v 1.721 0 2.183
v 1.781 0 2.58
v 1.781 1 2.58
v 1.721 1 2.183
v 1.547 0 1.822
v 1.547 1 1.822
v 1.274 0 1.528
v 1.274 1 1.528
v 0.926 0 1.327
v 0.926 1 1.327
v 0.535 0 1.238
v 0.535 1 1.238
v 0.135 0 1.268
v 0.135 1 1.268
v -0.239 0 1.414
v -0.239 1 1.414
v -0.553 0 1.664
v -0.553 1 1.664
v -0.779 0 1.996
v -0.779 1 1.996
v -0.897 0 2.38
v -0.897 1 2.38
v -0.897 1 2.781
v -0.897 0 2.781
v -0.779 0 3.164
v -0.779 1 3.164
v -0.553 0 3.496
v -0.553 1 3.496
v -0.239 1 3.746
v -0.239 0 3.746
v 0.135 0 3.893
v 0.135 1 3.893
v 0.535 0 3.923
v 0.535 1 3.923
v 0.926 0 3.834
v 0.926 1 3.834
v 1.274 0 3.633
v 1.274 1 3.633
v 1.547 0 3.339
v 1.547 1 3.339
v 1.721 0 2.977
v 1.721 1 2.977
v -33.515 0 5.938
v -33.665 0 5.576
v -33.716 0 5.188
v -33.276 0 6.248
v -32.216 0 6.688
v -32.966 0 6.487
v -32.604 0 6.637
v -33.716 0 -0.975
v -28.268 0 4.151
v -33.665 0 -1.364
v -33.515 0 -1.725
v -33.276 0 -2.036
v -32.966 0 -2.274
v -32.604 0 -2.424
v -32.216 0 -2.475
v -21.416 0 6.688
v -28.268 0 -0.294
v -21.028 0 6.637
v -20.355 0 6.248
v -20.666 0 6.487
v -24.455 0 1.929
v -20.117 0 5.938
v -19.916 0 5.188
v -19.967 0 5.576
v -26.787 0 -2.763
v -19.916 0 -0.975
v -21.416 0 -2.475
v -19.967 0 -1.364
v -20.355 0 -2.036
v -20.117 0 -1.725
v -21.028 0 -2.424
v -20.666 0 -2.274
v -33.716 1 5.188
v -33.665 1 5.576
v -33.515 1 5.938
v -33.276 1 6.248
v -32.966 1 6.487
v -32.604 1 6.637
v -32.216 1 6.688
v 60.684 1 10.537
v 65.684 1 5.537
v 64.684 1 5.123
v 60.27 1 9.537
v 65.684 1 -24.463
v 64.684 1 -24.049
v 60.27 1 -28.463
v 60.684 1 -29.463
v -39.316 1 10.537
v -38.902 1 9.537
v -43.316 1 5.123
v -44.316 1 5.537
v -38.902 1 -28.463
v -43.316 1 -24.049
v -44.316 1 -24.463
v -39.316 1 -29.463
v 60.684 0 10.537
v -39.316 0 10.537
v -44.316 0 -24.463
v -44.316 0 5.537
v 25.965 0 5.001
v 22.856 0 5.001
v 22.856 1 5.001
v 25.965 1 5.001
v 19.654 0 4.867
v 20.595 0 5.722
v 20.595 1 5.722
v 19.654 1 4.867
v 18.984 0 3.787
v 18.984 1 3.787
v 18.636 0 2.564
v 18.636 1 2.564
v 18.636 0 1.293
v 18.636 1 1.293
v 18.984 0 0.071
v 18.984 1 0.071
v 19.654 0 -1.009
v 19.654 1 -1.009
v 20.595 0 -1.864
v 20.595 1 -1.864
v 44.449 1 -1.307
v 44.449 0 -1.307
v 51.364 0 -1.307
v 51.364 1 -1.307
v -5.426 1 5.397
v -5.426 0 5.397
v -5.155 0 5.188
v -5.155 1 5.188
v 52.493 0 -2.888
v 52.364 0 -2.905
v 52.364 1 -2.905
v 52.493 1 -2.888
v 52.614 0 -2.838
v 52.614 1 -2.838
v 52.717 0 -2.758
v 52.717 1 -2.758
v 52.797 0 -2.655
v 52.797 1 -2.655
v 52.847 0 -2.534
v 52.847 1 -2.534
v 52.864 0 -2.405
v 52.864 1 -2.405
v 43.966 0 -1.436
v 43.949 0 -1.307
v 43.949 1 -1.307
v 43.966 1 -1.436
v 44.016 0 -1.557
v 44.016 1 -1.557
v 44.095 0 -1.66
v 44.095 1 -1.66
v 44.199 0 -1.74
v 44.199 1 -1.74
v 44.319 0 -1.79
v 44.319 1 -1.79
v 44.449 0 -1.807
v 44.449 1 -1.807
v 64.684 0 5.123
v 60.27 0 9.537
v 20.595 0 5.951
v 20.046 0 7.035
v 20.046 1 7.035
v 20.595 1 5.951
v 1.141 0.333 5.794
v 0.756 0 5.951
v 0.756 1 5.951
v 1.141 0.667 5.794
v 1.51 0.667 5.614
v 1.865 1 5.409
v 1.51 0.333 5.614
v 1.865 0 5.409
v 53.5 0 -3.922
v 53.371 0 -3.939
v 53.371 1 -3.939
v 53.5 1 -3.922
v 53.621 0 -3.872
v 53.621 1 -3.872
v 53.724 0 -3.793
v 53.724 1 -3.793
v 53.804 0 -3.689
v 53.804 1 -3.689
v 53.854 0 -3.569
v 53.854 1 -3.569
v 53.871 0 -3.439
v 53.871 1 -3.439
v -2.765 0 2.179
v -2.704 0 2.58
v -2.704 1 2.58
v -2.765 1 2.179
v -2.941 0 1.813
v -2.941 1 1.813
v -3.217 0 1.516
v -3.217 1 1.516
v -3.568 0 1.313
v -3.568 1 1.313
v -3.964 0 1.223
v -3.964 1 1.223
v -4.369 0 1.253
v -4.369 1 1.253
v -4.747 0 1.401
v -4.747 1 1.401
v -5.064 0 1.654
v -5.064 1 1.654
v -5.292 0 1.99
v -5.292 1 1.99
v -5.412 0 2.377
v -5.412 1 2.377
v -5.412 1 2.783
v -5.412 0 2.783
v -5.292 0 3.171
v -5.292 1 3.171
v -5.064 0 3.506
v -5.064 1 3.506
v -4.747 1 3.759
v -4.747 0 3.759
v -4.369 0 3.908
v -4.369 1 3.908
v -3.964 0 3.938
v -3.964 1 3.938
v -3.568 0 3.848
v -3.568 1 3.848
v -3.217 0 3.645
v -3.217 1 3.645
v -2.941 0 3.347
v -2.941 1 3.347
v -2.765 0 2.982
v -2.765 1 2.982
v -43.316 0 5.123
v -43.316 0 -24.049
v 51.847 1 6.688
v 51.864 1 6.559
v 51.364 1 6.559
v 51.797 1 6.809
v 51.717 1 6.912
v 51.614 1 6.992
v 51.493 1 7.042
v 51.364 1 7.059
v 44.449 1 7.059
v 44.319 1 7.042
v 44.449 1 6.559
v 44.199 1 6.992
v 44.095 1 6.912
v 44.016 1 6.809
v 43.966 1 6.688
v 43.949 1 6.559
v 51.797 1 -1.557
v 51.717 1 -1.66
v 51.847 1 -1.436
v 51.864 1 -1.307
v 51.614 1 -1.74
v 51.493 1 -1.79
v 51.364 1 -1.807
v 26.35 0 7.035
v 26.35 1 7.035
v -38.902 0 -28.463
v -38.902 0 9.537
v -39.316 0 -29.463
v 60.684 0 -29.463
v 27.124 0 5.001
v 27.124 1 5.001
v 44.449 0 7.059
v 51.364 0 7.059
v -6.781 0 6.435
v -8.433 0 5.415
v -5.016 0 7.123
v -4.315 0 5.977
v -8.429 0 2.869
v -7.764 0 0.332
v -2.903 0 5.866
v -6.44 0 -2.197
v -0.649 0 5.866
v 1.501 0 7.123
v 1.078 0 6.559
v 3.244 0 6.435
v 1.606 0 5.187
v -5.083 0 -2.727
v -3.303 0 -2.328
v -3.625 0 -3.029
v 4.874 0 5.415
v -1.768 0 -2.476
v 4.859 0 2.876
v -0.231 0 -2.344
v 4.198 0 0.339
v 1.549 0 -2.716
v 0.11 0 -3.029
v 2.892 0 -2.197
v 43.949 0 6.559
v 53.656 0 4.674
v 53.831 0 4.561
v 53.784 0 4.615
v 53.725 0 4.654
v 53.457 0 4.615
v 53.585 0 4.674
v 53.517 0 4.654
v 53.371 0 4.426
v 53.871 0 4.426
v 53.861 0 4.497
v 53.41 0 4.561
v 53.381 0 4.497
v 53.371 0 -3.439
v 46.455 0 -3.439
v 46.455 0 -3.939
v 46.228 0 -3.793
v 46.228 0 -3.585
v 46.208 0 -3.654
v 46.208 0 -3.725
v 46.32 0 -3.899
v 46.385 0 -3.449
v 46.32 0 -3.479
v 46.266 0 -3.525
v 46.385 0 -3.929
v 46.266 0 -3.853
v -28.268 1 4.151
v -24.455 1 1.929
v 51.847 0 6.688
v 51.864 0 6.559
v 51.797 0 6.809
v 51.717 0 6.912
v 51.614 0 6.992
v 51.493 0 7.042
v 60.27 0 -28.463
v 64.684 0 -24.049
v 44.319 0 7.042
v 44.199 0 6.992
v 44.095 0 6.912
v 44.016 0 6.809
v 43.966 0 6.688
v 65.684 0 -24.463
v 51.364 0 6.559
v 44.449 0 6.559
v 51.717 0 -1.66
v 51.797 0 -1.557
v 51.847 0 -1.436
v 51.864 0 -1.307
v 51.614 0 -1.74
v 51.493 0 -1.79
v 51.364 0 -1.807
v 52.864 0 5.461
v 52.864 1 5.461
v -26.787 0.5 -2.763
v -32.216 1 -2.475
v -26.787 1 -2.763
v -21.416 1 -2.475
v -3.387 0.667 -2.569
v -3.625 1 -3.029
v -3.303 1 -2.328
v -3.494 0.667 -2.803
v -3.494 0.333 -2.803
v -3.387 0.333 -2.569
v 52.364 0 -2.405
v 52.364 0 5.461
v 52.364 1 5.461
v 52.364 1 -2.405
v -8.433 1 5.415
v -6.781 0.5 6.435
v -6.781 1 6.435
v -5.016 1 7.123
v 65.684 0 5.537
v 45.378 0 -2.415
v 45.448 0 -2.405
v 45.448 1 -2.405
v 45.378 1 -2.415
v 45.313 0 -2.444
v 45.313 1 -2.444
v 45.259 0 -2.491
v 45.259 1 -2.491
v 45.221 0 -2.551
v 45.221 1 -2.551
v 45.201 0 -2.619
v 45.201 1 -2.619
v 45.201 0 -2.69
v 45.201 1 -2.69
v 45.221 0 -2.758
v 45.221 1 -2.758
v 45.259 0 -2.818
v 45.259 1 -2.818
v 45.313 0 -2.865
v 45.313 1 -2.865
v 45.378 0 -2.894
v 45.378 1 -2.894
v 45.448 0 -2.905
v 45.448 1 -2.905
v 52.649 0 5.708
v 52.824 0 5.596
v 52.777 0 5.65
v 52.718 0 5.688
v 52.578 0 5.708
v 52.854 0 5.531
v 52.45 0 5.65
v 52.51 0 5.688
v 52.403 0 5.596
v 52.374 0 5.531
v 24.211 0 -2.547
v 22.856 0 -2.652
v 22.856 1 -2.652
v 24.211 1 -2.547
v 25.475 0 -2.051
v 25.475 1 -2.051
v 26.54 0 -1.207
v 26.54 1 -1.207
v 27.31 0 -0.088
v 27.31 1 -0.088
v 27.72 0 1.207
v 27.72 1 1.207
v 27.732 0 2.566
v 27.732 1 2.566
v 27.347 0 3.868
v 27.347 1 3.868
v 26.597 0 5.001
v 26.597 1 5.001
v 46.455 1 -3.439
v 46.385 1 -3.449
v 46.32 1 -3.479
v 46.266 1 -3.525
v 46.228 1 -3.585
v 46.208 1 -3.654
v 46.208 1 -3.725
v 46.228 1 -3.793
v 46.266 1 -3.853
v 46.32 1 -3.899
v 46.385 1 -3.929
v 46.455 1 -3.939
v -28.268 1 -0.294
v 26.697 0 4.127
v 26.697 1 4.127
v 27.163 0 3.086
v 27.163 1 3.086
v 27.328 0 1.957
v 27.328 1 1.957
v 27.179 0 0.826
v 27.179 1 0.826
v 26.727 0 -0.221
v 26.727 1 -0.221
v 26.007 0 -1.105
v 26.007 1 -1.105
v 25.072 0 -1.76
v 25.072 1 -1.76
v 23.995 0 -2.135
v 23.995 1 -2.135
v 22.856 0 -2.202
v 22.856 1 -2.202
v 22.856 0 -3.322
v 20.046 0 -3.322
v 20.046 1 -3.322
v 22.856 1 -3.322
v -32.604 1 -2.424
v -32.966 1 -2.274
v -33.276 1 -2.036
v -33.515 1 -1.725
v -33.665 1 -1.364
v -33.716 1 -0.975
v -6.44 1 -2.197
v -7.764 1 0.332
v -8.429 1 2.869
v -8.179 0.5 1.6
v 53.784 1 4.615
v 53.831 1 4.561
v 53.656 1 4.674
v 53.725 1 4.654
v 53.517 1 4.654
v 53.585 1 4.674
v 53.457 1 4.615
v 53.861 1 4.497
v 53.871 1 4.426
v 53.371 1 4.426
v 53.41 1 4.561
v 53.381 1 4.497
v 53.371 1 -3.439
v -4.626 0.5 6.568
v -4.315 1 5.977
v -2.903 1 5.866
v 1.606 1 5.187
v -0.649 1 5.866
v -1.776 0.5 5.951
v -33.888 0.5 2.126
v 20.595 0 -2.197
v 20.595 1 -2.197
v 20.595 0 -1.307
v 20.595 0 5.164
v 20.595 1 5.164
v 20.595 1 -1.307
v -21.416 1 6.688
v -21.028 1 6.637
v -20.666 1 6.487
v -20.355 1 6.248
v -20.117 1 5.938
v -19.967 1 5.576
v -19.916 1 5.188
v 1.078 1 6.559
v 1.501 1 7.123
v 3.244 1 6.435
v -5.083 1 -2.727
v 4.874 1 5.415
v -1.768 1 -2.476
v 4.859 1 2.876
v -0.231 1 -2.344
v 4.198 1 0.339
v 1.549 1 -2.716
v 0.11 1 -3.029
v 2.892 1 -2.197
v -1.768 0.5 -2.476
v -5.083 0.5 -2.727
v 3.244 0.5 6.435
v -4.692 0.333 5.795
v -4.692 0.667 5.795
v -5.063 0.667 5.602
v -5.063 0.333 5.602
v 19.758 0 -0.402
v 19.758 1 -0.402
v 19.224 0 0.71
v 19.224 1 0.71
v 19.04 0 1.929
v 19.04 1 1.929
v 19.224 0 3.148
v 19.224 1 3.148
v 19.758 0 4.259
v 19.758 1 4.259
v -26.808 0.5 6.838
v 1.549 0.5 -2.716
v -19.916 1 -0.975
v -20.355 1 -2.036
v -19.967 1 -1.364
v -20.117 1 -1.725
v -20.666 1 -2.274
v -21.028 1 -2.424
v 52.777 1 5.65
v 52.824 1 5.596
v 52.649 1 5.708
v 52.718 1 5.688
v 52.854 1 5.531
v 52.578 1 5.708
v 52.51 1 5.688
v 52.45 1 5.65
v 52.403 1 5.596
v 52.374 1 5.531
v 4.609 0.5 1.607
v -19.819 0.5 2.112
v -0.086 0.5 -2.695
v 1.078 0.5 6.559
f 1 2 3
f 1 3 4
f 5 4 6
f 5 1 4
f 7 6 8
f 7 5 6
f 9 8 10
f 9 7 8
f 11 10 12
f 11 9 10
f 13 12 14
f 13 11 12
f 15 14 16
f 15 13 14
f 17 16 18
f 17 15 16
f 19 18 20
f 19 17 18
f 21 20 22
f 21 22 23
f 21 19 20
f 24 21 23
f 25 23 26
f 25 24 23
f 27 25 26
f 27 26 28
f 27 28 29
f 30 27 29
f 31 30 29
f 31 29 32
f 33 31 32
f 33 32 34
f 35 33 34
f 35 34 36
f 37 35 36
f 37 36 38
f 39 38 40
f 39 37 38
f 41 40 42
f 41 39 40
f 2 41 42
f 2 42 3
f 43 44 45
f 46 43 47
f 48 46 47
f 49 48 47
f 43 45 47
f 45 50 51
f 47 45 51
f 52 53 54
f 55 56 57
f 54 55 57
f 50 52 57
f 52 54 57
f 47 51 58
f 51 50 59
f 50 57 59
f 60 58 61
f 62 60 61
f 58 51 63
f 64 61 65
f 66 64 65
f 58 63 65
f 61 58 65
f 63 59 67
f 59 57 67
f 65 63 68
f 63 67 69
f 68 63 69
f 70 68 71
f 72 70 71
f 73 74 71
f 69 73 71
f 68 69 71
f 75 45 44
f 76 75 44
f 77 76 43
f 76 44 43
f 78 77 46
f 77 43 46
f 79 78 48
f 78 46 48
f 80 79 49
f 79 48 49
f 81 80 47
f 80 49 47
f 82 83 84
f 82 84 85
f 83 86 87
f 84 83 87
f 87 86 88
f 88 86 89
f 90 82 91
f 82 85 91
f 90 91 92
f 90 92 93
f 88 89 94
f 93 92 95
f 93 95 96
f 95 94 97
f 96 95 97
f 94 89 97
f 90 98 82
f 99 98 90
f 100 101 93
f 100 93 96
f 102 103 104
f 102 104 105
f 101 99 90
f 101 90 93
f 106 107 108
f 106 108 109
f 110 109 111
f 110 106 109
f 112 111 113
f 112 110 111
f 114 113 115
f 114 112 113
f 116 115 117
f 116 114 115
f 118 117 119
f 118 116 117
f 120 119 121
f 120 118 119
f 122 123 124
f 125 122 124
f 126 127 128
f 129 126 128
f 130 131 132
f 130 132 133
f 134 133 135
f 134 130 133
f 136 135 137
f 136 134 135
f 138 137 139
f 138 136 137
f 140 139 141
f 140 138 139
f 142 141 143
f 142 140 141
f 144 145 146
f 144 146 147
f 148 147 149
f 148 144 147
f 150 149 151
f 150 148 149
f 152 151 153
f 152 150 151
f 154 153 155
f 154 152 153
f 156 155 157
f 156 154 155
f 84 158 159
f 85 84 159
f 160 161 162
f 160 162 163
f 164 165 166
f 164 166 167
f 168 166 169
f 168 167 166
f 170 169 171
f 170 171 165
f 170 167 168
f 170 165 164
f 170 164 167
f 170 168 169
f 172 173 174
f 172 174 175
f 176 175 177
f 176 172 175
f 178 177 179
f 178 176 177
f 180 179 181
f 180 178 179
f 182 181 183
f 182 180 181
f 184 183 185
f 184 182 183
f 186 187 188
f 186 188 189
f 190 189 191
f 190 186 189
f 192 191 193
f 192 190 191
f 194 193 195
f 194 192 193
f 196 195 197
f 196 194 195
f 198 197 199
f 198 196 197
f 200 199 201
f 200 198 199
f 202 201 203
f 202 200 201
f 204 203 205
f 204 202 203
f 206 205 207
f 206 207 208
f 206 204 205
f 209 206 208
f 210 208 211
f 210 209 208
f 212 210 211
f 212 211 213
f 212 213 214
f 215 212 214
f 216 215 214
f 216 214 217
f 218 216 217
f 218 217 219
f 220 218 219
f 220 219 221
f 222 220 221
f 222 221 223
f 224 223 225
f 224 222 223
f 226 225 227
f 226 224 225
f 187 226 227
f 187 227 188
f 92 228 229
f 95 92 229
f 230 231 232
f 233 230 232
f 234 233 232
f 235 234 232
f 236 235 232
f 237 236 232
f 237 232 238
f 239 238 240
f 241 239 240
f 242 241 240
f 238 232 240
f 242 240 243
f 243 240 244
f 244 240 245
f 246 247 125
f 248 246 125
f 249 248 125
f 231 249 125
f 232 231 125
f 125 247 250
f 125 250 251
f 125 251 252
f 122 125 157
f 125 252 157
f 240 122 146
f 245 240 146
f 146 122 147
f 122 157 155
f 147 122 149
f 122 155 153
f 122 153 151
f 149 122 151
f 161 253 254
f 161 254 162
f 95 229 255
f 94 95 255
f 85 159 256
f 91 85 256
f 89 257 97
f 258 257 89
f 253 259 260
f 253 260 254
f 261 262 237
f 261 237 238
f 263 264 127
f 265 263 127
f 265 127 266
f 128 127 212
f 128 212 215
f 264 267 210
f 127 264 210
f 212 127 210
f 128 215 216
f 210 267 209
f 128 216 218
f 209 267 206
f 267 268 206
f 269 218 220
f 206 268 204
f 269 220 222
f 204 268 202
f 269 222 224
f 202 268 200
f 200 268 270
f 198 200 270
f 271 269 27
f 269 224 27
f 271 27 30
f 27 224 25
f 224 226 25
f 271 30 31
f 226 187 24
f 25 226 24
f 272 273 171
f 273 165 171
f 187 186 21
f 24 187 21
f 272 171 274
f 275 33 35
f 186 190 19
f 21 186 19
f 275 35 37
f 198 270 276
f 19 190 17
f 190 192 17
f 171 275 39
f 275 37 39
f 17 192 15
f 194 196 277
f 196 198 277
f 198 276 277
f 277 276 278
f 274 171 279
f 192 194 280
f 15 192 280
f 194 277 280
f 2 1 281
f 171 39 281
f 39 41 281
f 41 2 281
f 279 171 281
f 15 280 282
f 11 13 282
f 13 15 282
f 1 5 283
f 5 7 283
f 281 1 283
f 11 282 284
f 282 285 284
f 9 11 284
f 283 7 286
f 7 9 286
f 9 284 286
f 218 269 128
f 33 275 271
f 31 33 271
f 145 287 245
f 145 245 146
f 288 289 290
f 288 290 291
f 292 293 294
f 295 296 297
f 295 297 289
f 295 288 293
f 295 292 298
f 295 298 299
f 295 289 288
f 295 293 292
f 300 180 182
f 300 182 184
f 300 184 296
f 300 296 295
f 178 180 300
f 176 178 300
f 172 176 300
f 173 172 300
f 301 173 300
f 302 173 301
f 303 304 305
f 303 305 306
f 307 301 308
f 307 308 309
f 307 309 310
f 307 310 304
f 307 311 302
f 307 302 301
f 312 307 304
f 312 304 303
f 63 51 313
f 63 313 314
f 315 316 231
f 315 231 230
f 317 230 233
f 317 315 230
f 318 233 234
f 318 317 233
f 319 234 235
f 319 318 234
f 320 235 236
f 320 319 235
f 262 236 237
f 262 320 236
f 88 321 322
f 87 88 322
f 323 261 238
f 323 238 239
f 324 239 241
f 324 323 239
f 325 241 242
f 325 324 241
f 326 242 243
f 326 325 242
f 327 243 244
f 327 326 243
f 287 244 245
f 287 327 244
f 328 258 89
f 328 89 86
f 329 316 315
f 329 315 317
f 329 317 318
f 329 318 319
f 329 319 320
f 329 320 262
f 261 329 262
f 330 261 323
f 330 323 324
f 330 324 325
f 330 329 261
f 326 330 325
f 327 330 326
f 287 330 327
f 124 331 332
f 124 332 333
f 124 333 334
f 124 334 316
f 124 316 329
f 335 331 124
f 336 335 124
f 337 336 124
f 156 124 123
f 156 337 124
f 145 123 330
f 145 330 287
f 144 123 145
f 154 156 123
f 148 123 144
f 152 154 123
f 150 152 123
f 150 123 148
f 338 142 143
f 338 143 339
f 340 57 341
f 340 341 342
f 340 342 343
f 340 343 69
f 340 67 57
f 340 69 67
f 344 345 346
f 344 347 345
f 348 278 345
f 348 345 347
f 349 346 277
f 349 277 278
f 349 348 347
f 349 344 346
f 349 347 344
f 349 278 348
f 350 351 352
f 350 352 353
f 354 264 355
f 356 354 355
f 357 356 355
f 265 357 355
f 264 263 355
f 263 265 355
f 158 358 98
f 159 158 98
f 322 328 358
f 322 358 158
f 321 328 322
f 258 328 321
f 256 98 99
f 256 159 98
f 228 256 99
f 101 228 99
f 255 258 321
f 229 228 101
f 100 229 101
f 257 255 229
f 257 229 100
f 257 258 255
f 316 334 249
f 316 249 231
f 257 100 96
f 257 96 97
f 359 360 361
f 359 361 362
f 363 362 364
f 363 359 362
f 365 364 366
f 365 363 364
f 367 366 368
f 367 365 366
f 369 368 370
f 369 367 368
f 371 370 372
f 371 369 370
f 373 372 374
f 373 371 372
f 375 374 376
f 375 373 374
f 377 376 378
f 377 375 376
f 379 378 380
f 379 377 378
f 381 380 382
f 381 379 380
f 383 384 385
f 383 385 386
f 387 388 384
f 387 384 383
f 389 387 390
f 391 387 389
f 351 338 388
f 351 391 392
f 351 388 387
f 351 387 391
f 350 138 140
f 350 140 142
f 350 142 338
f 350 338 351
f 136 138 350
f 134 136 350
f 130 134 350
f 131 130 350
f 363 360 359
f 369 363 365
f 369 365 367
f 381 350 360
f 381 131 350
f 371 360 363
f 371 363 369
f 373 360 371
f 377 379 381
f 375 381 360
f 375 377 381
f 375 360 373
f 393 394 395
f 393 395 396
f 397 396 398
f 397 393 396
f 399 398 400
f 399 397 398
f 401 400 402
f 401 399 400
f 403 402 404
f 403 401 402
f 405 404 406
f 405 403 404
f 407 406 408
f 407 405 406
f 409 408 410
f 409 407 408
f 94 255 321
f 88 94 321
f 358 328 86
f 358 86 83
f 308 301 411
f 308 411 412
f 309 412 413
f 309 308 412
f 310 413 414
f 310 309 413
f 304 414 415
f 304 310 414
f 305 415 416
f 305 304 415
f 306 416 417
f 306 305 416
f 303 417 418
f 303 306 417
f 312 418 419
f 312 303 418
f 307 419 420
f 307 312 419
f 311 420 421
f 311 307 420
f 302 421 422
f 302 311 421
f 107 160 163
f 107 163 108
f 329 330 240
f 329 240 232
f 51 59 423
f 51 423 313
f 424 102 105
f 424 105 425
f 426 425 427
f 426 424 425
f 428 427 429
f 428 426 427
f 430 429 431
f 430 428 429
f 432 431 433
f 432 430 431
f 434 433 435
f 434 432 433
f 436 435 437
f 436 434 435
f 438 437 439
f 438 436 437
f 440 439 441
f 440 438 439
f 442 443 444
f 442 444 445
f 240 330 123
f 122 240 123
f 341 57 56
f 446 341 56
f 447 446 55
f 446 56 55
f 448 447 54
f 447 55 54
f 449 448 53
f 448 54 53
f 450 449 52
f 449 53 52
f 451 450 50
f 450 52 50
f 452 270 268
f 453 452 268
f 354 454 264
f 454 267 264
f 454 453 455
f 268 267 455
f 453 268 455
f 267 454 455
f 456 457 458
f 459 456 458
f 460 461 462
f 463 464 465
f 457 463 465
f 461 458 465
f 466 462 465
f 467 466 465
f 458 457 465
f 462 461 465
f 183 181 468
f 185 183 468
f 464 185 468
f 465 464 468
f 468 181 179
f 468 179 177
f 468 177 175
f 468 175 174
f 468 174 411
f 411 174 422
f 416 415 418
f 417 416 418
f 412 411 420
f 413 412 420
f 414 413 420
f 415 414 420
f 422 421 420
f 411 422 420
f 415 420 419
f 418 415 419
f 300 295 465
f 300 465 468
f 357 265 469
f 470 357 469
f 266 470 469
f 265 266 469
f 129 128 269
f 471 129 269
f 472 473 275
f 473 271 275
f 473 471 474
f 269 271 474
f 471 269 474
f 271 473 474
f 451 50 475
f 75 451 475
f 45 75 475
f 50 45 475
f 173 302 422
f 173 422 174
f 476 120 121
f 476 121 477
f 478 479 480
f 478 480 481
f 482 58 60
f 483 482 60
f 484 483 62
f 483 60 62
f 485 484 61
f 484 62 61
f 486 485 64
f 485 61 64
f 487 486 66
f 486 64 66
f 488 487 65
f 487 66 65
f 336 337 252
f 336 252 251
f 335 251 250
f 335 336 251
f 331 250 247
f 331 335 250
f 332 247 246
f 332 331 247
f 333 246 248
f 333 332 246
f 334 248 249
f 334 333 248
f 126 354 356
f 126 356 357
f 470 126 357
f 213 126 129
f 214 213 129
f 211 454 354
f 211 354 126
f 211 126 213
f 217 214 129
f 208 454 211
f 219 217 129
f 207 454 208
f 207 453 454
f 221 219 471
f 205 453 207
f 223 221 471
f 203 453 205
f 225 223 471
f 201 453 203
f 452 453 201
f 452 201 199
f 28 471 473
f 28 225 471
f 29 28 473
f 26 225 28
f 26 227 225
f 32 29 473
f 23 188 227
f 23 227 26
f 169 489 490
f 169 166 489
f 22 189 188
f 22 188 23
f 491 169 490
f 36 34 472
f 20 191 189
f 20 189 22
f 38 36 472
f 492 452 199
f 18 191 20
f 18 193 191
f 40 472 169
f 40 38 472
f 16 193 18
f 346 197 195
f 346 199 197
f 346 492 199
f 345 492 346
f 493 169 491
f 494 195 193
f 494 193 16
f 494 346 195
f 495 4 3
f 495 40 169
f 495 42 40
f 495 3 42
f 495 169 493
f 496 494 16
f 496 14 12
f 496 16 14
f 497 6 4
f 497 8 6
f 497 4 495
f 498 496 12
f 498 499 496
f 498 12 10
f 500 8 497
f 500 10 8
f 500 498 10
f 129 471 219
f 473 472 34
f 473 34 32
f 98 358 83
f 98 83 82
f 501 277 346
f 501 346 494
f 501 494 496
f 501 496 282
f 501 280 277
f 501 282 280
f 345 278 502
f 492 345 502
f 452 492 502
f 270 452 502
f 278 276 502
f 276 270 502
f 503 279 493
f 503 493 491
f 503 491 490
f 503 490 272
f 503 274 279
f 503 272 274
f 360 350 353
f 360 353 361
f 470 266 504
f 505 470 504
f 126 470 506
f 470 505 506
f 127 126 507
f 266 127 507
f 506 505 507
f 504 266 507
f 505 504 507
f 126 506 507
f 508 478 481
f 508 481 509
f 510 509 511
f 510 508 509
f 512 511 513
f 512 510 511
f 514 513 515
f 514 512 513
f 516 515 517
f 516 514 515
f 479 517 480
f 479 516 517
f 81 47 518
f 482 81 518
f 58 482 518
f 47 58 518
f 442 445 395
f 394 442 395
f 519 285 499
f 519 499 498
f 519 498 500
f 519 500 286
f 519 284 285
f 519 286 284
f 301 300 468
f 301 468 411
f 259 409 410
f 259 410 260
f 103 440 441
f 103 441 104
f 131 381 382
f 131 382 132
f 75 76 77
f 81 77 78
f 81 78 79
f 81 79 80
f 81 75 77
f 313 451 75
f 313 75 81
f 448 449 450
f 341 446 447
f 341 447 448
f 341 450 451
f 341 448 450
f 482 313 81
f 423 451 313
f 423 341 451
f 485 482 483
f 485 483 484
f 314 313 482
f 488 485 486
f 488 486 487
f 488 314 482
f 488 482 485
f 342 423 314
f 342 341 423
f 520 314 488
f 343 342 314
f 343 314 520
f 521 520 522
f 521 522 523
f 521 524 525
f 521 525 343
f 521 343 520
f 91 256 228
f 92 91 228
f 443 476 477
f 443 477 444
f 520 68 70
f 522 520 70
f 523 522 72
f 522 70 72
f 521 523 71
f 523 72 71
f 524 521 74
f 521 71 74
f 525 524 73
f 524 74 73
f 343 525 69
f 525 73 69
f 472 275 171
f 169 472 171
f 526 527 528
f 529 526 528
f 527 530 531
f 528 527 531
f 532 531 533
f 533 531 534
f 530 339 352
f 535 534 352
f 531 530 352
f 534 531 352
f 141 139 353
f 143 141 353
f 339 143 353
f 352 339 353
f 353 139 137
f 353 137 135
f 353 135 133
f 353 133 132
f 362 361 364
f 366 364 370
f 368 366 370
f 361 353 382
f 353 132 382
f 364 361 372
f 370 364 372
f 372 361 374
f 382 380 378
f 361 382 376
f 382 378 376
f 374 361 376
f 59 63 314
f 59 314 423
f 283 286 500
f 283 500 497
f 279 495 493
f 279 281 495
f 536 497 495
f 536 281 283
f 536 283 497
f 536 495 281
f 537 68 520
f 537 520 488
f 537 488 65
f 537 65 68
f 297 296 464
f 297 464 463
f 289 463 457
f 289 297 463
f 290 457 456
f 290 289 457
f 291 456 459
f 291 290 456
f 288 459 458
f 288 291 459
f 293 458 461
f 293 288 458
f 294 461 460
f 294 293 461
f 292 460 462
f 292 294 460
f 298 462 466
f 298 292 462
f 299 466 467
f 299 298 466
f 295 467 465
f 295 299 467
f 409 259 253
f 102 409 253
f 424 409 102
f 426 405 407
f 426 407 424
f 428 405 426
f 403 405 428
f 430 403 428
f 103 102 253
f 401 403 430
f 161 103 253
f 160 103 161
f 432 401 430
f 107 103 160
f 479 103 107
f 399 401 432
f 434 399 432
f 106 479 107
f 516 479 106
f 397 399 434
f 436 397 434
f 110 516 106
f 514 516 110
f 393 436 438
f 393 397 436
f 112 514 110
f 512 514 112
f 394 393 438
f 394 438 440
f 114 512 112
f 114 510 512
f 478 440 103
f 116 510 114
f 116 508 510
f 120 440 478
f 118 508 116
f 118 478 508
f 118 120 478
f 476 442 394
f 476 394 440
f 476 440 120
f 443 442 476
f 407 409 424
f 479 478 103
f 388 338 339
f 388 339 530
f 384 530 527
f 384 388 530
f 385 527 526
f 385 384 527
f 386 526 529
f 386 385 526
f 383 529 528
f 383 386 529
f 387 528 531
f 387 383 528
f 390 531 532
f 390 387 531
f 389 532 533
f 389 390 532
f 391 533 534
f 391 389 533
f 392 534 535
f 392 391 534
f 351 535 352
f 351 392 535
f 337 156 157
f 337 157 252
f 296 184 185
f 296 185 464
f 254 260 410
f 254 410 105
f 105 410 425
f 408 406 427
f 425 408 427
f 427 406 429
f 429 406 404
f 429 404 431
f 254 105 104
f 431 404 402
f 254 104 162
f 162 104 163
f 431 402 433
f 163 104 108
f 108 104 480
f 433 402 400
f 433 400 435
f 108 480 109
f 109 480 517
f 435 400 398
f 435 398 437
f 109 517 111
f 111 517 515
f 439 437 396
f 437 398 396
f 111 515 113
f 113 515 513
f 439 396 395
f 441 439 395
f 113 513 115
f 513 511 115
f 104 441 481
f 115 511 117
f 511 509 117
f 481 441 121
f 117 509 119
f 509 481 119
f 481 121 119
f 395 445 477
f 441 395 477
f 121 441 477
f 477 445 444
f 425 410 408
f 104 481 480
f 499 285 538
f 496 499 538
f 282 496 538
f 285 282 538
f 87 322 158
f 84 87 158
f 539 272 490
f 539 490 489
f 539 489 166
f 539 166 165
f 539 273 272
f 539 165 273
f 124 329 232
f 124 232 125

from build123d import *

# Parameters (mm, degrees)
SALIENTE_EXTRUIR1_DEPTH   = 1
CROQUIS2_R                = 1.361497815
CROQUIS2_R_2              = 1.346376897
SALIENTE_EXTRUIR2_DEPTH   = 1
SALIENTE_EXTRUIR2_2_DEPTH = 1
CROQUIS2_W                = 6.915366852
CROQUIS2_H                = 7.865481614
SALIENTE_EXTRUIR2_3_DEPTH = 1
SALIENTE_EXTRUIR2_4_DEPTH = 1
SALIENTE_EXTRUIR2_5_DEPTH = 1
SALIENTE_EXTRUIR2_6_DEPTH = 1


with BuildPart() as part:
    # Croquis1 → Saliente-Extruir1 (new body)
    with BuildSketch(Plane(origin=(0, 0, 0), x_dir=(1, 0, 0), z_dir=(0, 1, 0))):
        Polygon((-44.315779358, 24.462894216), (-39.315779358, 29.462894216), (60.684220642, 29.462894216), (65.684220642, 24.462894216), (65.684220642, -5.537105784), (60.684220642, -10.537105784), (-39.315779358, -10.537105784), (-44.315779358, -5.537105784), align=None)
        Polygon((-38.901565795, 28.462894216), (60.27000708, 28.462894216), (64.684220642, 24.048680653), (64.684220642, -5.122892222), (60.27000708, -9.537105784), (-38.901565795, -9.537105784), (-43.315779358, -5.122892222), (-43.315779358, 24.048680653), align=None, mode=Mode.SUBTRACT)
    extrude(amount=SALIENTE_EXTRUIR1_DEPTH)


with BuildPart() as body_2:
    # Croquis2 → Saliente-Extruir2 (new body)
    with BuildSketch(Plane(origin=(0, 0, 0), x_dir=(1, 0, 0), z_dir=(0, 1, 0))):
        with BuildLine():
            Line((-5.426404078, -5.396825328), (-5.154570208, -5.187722351))
            add(Edge.make_bspline(
                [(-5.154570208, -5.187722351), (-1.778047769, -6.715067504), (1.606327628, -5.187161649)],
                knots=[0, 0, 0, 1, 1, 1], degree=2))
            Line((1.606327628, -5.187161649), (1.865225464, -5.409074079))
            add(Edge.make_bspline(
                [(0.756261058, -5.951152724), (1.147976609, -5.806384801), (1.517631405, -5.625691923), (1.865225464, -5.409074079)],
                knots=[0, 0, 0, 0, 0.529469077, 0.529469077, 0.529469077, 0.529469077], degree=3))
            add(Edge.make_bspline(
                [(1.500626334, -7.123006663), (1.026812248, -6.581682279), (0.756261058, -5.951152724)],
                knots=[0, 0, 0, 0.526803373, 0.526803373, 0.526803373], degree=2))
            add(Edge.make_bspline(
                [(4.873813374, -5.414509331), (3.301106847, -6.600422577), (1.500626334, -7.123006663)],
                knots=[0, 0, 0, 0.673867536, 0.673867536, 0.673867536], degree=2))
            add(Edge.make_bspline(
                [(2.891518393, 2.197065323), (5.335713187, -1.605769838), (4.873813374, -5.414509331)],
                knots=[0, 0, 0, 0.738778588, 0.738778588, 0.738778588], degree=2))
            add(Edge.make_bspline(
                [(0.109734275, 3.029410177), (1.596446356, 2.818732188), (2.891518393, 2.197065323)],
                knots=[0, 0, 0, 0.538264783, 0.538264783, 0.538264783], degree=2))
            add(Edge.make_bspline(
                [(0.109734275, 3.029410177), (-0.111898226, 2.70326467), (-0.230911201, 2.343767826)],
                knots=[0, 0, 0, 0.481523114, 0.481523114, 0.481523114], degree=2))
            add(Edge.make_bspline(
                [(-3.303499979, 2.328290465), (-1.769398985, 2.615501041), (-0.230911201, 2.343767826)],
                knots=[0, 0, 0, 1, 1, 1], degree=2))
            add(Edge.make_bspline(
                [(-3.624865664, 3.029410177), (-3.482156193, 2.806092888), (-3.375045086, 2.572423128), (-3.303499979, 2.328290465)],
                knots=[0, 0, 0, 0, 0.489643316, 0.489643316, 0.489643316, 0.489643316], degree=3))
            add(Edge.make_bspline(
                [(-3.624865664, 3.029410177), (-5.132917301, 2.840619601), (-6.4395055, 2.197065323)],
                knots=[0, 0, 0, 0.656124826, 0.656124826, 0.656124826], degree=2))
            add(Edge.make_bspline(
                [(-6.4395055, 2.197065323), (-8.921718156, -1.590554285), (-8.432752387, -5.414509331)],
                knots=[0, 0, 0, 0.78193849, 0.78193849, 0.78193849], degree=2))
            add(Edge.make_bspline(
                [(-8.432752387, -5.414509331), (-6.836935569, -6.602143075), (-5.015757723, -7.123006663)],
                knots=[0, 0, 0, 0.671017773, 0.671017773, 0.671017773], degree=2))
            add(Edge.make_bspline(
                [(-5.015757723, -7.123006663), (-4.585994773, -6.585318237), (-4.315243519, -5.97687157)],
                knots=[0, 0, 0, 0.510782069, 0.510782069, 0.510782069], degree=2))
            add(Edge.make_bspline(
                [(-4.315243519, -5.97687157), (-4.695614995, -5.800597715), (-5.066001846, -5.607248965), (-5.426404078, -5.396825328)],
                knots=[0, 0, 0, 0, 0.479761456, 0.479761456, 0.479761456, 0.479761456], degree=3))
        make_face()
        with Locations((-4.065779358, -2.580256668)):
            Circle(CROQUIS2_R, mode=Mode.SUBTRACT)
        with Locations((0.434220642, -2.580256668)):
            Circle(CROQUIS2_R_2, mode=Mode.SUBTRACT)
    extrude(amount=SALIENTE_EXTRUIR2_DEPTH)


with BuildPart() as body_3:
    # Croquis2 → Saliente-Extruir2 2 (new body)
    with BuildSketch(Plane(origin=(0, 0, 0), x_dir=(1, 0, 0), z_dir=(0, 1, 0))):
        with BuildLine():
            Line((20.045620158, 3.322115288), (22.856440669, 3.322115288))
            Line((22.856440669, 3.322115288), (22.856440669, 2.651881324))
            ThreePointArc((22.856440669, 2.651881324), (27.310139453, 0.087946094), (26.597494702, -5.001389244))
            Line((26.597494702, -5.001389244), (27.123697346, -5.001389244))
            Line((27.123697346, -5.001389244), (26.350477055, -7.035124087))
            Line((26.350477055, -7.035124087), (20.045620158, -7.035124087))
            Line((20.045620158, -7.035124087), (20.59503046, -5.951152724))
            Line((20.59503046, -5.951152724), (20.59503046, -5.721878986))
            ThreePointArc((20.59503046, -5.721878986), (18.591751, -1.928876005), (20.59503046, 1.864126976))
            Line((20.59503046, 1.864126976), (20.59503046, 2.197065323))
            Line((20.59503046, 2.197065323), (20.045620158, 3.322115288))
        make_face()
        with BuildLine():
            Line((22.856440669, -5.001389244), (25.964881426, -5.001389244))
            ThreePointArc((25.964881426, -5.001389244), (26.989049751, -0.287021123), (22.856440669, 2.202101155))
            Line((22.856440669, 2.202101155), (22.856440669, -5.001389244))
        make_face(mode=Mode.SUBTRACT)
        with BuildLine():
            Line((20.59503046, -5.164383106), (20.59503046, 1.306631097))
            ThreePointArc((20.59503046, 1.306631097), (19.040259735, -1.928876005), (20.59503046, -5.164383106))
        make_face(mode=Mode.SUBTRACT)
    extrude(amount=SALIENTE_EXTRUIR2_2_DEPTH)


with BuildPart() as body_4:
    # Croquis2 → Saliente-Extruir2 3 (new body)
    with BuildSketch(Plane(origin=(0, 0, 0), x_dir=(1, 0, 0), z_dir=(0, 1, 0))):
        with BuildLine():
            Line((44.448553025, 1.806631097), (51.363919877, 1.806631097))
            ThreePointArc((51.363919877, 1.806631097), (51.717473267, 1.660184488), (51.863919877, 1.306631097))
            Line((51.863919877, 1.306631097), (51.863919877, -6.558850517))
            ThreePointArc((51.863919877, -6.558850517), (51.717473267, -6.912403908), (51.363919877, -7.058850517))
            Line((51.363919877, -7.058850517), (44.448553025, -7.058850517))
            ThreePointArc((44.448553025, -7.058850517), (44.094999635, -6.912403908), (43.948553025, -6.558850517))
            Line((43.948553025, -6.558850517), (43.948553025, 1.306631097))
            ThreePointArc((43.948553025, 1.306631097), (44.094999635, 1.660184488), (44.448553025, 1.806631097))
        make_face()
        with Locations((47.906236451, -2.62610971)):
            Rectangle(CROQUIS2_W, CROQUIS2_H, mode=Mode.SUBTRACT)
    extrude(amount=SALIENTE_EXTRUIR2_3_DEPTH)


with BuildPart() as body_5:
    # Croquis2 → Saliente-Extruir2 4 (new body)
    with BuildSketch(Plane(origin=(0, 0, 0), x_dir=(1, 0, 0), z_dir=(0, 1, 0))):
        with BuildLine():
            Line((45.448311848, 2.90454651), (52.3636787, 2.90454651))
            ThreePointArc((52.3636787, 2.90454651), (52.71723209, 2.758099901), (52.8636787, 2.40454651))
            Line((52.8636787, 2.40454651), (52.8636787, -5.460935104))
            ThreePointArc((52.8636787, -5.460935104), (52.6136787, -5.710935104), (52.3636787, -5.460935104))
            Line((52.3636787, -5.460935104), (52.3636787, 2.40454651))
            Line((52.3636787, 2.40454651), (45.448311848, 2.40454651))
            ThreePointArc((45.448311848, 2.40454651), (45.198311848, 2.65454651), (45.448311848, 2.90454651))
        make_face()
    extrude(amount=SALIENTE_EXTRUIR2_4_DEPTH)


with BuildPart() as body_6:
    # Croquis2 → Saliente-Extruir2 5 (new body)
    with BuildSketch(Plane(origin=(0, 0, 0), x_dir=(1, 0, 0), z_dir=(0, 1, 0))):
        with BuildLine():
            Line((46.455317987, 3.939141858), (53.370684838, 3.939141858))
            ThreePointArc((53.370684838, 3.939141858), (53.724238229, 3.792695248), (53.870684838, 3.439141858))
            Line((53.870684838, 3.439141858), (53.870684838, -4.426339756))
            ThreePointArc((53.870684838, -4.426339756), (53.620684838, -4.676339756), (53.370684838, -4.426339756))
            Line((53.370684838, -4.426339756), (53.370684838, 3.439141858))
            Line((53.370684838, 3.439141858), (46.455317987, 3.439141858))
            ThreePointArc((46.455317987, 3.439141858), (46.205317987, 3.689141858), (46.455317987, 3.939141858))
        make_face()
    extrude(amount=SALIENTE_EXTRUIR2_5_DEPTH)


with BuildPart() as body_7:
    # Croquis2 → Saliente-Extruir2 6 (new body)
    with BuildSketch(Plane(origin=(0, 0, 0), x_dir=(1, 0, 0), z_dir=(0, 1, 0))):
        with BuildLine():
            ThreePointArc((-32.215779358, 2.475392476), (-33.27643953, 2.036052648), (-33.715779358, 0.975392476))
            add(Edge.make_bspline(
                [(-33.715779358, 0.975392476), (-34.060193738, -2.145099996), (-33.715779358, -5.187722351)],
                knots=[0, 0, 0, 0.500652544, 0.500652544, 0.500652544], degree=2))
            ThreePointArc((-33.715779358, -5.187722351), (-33.27643953, -6.248382523), (-32.215779358, -6.687722351))
            add(Edge.make_bspline(
                [(-32.215779358, -6.687722351), (-26.800341588, -6.988342953), (-21.415779358, -6.687722351)],
                knots=[0, 0, 0, 0.543466747, 0.543466747, 0.543466747], degree=2))
            ThreePointArc((-21.415779358, -6.687722351), (-20.355119186, -6.248382523), (-19.915779358, -5.187722351))
            add(Edge.make_bspline(
                [(-19.915779358, 0.975392476), (-19.722500126, -2.118211874), (-19.915779358, -5.187722351)],
                knots=[0, 0, 0, 0.505100069, 0.505100069, 0.505100069], degree=2))
            ThreePointArc((-19.915779358, 0.975392476), (-20.355119186, 2.036052648), (-21.415779358, 2.475392476))
            add(Edge.make_bspline(
                [(-32.215779358, 2.475392476), (-26.758622525, 3.049836136), (-21.415779358, 2.475392476)],
                knots=[0, 0, 0, 0.539860314, 0.539860314, 0.539860314], degree=2))
        make_face()
        Polygon((-28.268379534, 0.293537194), (-28.268379534, -4.151289204), (-24.455058525, -1.928876005), align=None, mode=Mode.SUBTRACT)
    extrude(amount=SALIENTE_EXTRUIR2_6_DEPTH)


solid = Compound([part.part, body_2.part, body_3.part, body_4.part, body_5.part, body_6.part, body_7.part])
